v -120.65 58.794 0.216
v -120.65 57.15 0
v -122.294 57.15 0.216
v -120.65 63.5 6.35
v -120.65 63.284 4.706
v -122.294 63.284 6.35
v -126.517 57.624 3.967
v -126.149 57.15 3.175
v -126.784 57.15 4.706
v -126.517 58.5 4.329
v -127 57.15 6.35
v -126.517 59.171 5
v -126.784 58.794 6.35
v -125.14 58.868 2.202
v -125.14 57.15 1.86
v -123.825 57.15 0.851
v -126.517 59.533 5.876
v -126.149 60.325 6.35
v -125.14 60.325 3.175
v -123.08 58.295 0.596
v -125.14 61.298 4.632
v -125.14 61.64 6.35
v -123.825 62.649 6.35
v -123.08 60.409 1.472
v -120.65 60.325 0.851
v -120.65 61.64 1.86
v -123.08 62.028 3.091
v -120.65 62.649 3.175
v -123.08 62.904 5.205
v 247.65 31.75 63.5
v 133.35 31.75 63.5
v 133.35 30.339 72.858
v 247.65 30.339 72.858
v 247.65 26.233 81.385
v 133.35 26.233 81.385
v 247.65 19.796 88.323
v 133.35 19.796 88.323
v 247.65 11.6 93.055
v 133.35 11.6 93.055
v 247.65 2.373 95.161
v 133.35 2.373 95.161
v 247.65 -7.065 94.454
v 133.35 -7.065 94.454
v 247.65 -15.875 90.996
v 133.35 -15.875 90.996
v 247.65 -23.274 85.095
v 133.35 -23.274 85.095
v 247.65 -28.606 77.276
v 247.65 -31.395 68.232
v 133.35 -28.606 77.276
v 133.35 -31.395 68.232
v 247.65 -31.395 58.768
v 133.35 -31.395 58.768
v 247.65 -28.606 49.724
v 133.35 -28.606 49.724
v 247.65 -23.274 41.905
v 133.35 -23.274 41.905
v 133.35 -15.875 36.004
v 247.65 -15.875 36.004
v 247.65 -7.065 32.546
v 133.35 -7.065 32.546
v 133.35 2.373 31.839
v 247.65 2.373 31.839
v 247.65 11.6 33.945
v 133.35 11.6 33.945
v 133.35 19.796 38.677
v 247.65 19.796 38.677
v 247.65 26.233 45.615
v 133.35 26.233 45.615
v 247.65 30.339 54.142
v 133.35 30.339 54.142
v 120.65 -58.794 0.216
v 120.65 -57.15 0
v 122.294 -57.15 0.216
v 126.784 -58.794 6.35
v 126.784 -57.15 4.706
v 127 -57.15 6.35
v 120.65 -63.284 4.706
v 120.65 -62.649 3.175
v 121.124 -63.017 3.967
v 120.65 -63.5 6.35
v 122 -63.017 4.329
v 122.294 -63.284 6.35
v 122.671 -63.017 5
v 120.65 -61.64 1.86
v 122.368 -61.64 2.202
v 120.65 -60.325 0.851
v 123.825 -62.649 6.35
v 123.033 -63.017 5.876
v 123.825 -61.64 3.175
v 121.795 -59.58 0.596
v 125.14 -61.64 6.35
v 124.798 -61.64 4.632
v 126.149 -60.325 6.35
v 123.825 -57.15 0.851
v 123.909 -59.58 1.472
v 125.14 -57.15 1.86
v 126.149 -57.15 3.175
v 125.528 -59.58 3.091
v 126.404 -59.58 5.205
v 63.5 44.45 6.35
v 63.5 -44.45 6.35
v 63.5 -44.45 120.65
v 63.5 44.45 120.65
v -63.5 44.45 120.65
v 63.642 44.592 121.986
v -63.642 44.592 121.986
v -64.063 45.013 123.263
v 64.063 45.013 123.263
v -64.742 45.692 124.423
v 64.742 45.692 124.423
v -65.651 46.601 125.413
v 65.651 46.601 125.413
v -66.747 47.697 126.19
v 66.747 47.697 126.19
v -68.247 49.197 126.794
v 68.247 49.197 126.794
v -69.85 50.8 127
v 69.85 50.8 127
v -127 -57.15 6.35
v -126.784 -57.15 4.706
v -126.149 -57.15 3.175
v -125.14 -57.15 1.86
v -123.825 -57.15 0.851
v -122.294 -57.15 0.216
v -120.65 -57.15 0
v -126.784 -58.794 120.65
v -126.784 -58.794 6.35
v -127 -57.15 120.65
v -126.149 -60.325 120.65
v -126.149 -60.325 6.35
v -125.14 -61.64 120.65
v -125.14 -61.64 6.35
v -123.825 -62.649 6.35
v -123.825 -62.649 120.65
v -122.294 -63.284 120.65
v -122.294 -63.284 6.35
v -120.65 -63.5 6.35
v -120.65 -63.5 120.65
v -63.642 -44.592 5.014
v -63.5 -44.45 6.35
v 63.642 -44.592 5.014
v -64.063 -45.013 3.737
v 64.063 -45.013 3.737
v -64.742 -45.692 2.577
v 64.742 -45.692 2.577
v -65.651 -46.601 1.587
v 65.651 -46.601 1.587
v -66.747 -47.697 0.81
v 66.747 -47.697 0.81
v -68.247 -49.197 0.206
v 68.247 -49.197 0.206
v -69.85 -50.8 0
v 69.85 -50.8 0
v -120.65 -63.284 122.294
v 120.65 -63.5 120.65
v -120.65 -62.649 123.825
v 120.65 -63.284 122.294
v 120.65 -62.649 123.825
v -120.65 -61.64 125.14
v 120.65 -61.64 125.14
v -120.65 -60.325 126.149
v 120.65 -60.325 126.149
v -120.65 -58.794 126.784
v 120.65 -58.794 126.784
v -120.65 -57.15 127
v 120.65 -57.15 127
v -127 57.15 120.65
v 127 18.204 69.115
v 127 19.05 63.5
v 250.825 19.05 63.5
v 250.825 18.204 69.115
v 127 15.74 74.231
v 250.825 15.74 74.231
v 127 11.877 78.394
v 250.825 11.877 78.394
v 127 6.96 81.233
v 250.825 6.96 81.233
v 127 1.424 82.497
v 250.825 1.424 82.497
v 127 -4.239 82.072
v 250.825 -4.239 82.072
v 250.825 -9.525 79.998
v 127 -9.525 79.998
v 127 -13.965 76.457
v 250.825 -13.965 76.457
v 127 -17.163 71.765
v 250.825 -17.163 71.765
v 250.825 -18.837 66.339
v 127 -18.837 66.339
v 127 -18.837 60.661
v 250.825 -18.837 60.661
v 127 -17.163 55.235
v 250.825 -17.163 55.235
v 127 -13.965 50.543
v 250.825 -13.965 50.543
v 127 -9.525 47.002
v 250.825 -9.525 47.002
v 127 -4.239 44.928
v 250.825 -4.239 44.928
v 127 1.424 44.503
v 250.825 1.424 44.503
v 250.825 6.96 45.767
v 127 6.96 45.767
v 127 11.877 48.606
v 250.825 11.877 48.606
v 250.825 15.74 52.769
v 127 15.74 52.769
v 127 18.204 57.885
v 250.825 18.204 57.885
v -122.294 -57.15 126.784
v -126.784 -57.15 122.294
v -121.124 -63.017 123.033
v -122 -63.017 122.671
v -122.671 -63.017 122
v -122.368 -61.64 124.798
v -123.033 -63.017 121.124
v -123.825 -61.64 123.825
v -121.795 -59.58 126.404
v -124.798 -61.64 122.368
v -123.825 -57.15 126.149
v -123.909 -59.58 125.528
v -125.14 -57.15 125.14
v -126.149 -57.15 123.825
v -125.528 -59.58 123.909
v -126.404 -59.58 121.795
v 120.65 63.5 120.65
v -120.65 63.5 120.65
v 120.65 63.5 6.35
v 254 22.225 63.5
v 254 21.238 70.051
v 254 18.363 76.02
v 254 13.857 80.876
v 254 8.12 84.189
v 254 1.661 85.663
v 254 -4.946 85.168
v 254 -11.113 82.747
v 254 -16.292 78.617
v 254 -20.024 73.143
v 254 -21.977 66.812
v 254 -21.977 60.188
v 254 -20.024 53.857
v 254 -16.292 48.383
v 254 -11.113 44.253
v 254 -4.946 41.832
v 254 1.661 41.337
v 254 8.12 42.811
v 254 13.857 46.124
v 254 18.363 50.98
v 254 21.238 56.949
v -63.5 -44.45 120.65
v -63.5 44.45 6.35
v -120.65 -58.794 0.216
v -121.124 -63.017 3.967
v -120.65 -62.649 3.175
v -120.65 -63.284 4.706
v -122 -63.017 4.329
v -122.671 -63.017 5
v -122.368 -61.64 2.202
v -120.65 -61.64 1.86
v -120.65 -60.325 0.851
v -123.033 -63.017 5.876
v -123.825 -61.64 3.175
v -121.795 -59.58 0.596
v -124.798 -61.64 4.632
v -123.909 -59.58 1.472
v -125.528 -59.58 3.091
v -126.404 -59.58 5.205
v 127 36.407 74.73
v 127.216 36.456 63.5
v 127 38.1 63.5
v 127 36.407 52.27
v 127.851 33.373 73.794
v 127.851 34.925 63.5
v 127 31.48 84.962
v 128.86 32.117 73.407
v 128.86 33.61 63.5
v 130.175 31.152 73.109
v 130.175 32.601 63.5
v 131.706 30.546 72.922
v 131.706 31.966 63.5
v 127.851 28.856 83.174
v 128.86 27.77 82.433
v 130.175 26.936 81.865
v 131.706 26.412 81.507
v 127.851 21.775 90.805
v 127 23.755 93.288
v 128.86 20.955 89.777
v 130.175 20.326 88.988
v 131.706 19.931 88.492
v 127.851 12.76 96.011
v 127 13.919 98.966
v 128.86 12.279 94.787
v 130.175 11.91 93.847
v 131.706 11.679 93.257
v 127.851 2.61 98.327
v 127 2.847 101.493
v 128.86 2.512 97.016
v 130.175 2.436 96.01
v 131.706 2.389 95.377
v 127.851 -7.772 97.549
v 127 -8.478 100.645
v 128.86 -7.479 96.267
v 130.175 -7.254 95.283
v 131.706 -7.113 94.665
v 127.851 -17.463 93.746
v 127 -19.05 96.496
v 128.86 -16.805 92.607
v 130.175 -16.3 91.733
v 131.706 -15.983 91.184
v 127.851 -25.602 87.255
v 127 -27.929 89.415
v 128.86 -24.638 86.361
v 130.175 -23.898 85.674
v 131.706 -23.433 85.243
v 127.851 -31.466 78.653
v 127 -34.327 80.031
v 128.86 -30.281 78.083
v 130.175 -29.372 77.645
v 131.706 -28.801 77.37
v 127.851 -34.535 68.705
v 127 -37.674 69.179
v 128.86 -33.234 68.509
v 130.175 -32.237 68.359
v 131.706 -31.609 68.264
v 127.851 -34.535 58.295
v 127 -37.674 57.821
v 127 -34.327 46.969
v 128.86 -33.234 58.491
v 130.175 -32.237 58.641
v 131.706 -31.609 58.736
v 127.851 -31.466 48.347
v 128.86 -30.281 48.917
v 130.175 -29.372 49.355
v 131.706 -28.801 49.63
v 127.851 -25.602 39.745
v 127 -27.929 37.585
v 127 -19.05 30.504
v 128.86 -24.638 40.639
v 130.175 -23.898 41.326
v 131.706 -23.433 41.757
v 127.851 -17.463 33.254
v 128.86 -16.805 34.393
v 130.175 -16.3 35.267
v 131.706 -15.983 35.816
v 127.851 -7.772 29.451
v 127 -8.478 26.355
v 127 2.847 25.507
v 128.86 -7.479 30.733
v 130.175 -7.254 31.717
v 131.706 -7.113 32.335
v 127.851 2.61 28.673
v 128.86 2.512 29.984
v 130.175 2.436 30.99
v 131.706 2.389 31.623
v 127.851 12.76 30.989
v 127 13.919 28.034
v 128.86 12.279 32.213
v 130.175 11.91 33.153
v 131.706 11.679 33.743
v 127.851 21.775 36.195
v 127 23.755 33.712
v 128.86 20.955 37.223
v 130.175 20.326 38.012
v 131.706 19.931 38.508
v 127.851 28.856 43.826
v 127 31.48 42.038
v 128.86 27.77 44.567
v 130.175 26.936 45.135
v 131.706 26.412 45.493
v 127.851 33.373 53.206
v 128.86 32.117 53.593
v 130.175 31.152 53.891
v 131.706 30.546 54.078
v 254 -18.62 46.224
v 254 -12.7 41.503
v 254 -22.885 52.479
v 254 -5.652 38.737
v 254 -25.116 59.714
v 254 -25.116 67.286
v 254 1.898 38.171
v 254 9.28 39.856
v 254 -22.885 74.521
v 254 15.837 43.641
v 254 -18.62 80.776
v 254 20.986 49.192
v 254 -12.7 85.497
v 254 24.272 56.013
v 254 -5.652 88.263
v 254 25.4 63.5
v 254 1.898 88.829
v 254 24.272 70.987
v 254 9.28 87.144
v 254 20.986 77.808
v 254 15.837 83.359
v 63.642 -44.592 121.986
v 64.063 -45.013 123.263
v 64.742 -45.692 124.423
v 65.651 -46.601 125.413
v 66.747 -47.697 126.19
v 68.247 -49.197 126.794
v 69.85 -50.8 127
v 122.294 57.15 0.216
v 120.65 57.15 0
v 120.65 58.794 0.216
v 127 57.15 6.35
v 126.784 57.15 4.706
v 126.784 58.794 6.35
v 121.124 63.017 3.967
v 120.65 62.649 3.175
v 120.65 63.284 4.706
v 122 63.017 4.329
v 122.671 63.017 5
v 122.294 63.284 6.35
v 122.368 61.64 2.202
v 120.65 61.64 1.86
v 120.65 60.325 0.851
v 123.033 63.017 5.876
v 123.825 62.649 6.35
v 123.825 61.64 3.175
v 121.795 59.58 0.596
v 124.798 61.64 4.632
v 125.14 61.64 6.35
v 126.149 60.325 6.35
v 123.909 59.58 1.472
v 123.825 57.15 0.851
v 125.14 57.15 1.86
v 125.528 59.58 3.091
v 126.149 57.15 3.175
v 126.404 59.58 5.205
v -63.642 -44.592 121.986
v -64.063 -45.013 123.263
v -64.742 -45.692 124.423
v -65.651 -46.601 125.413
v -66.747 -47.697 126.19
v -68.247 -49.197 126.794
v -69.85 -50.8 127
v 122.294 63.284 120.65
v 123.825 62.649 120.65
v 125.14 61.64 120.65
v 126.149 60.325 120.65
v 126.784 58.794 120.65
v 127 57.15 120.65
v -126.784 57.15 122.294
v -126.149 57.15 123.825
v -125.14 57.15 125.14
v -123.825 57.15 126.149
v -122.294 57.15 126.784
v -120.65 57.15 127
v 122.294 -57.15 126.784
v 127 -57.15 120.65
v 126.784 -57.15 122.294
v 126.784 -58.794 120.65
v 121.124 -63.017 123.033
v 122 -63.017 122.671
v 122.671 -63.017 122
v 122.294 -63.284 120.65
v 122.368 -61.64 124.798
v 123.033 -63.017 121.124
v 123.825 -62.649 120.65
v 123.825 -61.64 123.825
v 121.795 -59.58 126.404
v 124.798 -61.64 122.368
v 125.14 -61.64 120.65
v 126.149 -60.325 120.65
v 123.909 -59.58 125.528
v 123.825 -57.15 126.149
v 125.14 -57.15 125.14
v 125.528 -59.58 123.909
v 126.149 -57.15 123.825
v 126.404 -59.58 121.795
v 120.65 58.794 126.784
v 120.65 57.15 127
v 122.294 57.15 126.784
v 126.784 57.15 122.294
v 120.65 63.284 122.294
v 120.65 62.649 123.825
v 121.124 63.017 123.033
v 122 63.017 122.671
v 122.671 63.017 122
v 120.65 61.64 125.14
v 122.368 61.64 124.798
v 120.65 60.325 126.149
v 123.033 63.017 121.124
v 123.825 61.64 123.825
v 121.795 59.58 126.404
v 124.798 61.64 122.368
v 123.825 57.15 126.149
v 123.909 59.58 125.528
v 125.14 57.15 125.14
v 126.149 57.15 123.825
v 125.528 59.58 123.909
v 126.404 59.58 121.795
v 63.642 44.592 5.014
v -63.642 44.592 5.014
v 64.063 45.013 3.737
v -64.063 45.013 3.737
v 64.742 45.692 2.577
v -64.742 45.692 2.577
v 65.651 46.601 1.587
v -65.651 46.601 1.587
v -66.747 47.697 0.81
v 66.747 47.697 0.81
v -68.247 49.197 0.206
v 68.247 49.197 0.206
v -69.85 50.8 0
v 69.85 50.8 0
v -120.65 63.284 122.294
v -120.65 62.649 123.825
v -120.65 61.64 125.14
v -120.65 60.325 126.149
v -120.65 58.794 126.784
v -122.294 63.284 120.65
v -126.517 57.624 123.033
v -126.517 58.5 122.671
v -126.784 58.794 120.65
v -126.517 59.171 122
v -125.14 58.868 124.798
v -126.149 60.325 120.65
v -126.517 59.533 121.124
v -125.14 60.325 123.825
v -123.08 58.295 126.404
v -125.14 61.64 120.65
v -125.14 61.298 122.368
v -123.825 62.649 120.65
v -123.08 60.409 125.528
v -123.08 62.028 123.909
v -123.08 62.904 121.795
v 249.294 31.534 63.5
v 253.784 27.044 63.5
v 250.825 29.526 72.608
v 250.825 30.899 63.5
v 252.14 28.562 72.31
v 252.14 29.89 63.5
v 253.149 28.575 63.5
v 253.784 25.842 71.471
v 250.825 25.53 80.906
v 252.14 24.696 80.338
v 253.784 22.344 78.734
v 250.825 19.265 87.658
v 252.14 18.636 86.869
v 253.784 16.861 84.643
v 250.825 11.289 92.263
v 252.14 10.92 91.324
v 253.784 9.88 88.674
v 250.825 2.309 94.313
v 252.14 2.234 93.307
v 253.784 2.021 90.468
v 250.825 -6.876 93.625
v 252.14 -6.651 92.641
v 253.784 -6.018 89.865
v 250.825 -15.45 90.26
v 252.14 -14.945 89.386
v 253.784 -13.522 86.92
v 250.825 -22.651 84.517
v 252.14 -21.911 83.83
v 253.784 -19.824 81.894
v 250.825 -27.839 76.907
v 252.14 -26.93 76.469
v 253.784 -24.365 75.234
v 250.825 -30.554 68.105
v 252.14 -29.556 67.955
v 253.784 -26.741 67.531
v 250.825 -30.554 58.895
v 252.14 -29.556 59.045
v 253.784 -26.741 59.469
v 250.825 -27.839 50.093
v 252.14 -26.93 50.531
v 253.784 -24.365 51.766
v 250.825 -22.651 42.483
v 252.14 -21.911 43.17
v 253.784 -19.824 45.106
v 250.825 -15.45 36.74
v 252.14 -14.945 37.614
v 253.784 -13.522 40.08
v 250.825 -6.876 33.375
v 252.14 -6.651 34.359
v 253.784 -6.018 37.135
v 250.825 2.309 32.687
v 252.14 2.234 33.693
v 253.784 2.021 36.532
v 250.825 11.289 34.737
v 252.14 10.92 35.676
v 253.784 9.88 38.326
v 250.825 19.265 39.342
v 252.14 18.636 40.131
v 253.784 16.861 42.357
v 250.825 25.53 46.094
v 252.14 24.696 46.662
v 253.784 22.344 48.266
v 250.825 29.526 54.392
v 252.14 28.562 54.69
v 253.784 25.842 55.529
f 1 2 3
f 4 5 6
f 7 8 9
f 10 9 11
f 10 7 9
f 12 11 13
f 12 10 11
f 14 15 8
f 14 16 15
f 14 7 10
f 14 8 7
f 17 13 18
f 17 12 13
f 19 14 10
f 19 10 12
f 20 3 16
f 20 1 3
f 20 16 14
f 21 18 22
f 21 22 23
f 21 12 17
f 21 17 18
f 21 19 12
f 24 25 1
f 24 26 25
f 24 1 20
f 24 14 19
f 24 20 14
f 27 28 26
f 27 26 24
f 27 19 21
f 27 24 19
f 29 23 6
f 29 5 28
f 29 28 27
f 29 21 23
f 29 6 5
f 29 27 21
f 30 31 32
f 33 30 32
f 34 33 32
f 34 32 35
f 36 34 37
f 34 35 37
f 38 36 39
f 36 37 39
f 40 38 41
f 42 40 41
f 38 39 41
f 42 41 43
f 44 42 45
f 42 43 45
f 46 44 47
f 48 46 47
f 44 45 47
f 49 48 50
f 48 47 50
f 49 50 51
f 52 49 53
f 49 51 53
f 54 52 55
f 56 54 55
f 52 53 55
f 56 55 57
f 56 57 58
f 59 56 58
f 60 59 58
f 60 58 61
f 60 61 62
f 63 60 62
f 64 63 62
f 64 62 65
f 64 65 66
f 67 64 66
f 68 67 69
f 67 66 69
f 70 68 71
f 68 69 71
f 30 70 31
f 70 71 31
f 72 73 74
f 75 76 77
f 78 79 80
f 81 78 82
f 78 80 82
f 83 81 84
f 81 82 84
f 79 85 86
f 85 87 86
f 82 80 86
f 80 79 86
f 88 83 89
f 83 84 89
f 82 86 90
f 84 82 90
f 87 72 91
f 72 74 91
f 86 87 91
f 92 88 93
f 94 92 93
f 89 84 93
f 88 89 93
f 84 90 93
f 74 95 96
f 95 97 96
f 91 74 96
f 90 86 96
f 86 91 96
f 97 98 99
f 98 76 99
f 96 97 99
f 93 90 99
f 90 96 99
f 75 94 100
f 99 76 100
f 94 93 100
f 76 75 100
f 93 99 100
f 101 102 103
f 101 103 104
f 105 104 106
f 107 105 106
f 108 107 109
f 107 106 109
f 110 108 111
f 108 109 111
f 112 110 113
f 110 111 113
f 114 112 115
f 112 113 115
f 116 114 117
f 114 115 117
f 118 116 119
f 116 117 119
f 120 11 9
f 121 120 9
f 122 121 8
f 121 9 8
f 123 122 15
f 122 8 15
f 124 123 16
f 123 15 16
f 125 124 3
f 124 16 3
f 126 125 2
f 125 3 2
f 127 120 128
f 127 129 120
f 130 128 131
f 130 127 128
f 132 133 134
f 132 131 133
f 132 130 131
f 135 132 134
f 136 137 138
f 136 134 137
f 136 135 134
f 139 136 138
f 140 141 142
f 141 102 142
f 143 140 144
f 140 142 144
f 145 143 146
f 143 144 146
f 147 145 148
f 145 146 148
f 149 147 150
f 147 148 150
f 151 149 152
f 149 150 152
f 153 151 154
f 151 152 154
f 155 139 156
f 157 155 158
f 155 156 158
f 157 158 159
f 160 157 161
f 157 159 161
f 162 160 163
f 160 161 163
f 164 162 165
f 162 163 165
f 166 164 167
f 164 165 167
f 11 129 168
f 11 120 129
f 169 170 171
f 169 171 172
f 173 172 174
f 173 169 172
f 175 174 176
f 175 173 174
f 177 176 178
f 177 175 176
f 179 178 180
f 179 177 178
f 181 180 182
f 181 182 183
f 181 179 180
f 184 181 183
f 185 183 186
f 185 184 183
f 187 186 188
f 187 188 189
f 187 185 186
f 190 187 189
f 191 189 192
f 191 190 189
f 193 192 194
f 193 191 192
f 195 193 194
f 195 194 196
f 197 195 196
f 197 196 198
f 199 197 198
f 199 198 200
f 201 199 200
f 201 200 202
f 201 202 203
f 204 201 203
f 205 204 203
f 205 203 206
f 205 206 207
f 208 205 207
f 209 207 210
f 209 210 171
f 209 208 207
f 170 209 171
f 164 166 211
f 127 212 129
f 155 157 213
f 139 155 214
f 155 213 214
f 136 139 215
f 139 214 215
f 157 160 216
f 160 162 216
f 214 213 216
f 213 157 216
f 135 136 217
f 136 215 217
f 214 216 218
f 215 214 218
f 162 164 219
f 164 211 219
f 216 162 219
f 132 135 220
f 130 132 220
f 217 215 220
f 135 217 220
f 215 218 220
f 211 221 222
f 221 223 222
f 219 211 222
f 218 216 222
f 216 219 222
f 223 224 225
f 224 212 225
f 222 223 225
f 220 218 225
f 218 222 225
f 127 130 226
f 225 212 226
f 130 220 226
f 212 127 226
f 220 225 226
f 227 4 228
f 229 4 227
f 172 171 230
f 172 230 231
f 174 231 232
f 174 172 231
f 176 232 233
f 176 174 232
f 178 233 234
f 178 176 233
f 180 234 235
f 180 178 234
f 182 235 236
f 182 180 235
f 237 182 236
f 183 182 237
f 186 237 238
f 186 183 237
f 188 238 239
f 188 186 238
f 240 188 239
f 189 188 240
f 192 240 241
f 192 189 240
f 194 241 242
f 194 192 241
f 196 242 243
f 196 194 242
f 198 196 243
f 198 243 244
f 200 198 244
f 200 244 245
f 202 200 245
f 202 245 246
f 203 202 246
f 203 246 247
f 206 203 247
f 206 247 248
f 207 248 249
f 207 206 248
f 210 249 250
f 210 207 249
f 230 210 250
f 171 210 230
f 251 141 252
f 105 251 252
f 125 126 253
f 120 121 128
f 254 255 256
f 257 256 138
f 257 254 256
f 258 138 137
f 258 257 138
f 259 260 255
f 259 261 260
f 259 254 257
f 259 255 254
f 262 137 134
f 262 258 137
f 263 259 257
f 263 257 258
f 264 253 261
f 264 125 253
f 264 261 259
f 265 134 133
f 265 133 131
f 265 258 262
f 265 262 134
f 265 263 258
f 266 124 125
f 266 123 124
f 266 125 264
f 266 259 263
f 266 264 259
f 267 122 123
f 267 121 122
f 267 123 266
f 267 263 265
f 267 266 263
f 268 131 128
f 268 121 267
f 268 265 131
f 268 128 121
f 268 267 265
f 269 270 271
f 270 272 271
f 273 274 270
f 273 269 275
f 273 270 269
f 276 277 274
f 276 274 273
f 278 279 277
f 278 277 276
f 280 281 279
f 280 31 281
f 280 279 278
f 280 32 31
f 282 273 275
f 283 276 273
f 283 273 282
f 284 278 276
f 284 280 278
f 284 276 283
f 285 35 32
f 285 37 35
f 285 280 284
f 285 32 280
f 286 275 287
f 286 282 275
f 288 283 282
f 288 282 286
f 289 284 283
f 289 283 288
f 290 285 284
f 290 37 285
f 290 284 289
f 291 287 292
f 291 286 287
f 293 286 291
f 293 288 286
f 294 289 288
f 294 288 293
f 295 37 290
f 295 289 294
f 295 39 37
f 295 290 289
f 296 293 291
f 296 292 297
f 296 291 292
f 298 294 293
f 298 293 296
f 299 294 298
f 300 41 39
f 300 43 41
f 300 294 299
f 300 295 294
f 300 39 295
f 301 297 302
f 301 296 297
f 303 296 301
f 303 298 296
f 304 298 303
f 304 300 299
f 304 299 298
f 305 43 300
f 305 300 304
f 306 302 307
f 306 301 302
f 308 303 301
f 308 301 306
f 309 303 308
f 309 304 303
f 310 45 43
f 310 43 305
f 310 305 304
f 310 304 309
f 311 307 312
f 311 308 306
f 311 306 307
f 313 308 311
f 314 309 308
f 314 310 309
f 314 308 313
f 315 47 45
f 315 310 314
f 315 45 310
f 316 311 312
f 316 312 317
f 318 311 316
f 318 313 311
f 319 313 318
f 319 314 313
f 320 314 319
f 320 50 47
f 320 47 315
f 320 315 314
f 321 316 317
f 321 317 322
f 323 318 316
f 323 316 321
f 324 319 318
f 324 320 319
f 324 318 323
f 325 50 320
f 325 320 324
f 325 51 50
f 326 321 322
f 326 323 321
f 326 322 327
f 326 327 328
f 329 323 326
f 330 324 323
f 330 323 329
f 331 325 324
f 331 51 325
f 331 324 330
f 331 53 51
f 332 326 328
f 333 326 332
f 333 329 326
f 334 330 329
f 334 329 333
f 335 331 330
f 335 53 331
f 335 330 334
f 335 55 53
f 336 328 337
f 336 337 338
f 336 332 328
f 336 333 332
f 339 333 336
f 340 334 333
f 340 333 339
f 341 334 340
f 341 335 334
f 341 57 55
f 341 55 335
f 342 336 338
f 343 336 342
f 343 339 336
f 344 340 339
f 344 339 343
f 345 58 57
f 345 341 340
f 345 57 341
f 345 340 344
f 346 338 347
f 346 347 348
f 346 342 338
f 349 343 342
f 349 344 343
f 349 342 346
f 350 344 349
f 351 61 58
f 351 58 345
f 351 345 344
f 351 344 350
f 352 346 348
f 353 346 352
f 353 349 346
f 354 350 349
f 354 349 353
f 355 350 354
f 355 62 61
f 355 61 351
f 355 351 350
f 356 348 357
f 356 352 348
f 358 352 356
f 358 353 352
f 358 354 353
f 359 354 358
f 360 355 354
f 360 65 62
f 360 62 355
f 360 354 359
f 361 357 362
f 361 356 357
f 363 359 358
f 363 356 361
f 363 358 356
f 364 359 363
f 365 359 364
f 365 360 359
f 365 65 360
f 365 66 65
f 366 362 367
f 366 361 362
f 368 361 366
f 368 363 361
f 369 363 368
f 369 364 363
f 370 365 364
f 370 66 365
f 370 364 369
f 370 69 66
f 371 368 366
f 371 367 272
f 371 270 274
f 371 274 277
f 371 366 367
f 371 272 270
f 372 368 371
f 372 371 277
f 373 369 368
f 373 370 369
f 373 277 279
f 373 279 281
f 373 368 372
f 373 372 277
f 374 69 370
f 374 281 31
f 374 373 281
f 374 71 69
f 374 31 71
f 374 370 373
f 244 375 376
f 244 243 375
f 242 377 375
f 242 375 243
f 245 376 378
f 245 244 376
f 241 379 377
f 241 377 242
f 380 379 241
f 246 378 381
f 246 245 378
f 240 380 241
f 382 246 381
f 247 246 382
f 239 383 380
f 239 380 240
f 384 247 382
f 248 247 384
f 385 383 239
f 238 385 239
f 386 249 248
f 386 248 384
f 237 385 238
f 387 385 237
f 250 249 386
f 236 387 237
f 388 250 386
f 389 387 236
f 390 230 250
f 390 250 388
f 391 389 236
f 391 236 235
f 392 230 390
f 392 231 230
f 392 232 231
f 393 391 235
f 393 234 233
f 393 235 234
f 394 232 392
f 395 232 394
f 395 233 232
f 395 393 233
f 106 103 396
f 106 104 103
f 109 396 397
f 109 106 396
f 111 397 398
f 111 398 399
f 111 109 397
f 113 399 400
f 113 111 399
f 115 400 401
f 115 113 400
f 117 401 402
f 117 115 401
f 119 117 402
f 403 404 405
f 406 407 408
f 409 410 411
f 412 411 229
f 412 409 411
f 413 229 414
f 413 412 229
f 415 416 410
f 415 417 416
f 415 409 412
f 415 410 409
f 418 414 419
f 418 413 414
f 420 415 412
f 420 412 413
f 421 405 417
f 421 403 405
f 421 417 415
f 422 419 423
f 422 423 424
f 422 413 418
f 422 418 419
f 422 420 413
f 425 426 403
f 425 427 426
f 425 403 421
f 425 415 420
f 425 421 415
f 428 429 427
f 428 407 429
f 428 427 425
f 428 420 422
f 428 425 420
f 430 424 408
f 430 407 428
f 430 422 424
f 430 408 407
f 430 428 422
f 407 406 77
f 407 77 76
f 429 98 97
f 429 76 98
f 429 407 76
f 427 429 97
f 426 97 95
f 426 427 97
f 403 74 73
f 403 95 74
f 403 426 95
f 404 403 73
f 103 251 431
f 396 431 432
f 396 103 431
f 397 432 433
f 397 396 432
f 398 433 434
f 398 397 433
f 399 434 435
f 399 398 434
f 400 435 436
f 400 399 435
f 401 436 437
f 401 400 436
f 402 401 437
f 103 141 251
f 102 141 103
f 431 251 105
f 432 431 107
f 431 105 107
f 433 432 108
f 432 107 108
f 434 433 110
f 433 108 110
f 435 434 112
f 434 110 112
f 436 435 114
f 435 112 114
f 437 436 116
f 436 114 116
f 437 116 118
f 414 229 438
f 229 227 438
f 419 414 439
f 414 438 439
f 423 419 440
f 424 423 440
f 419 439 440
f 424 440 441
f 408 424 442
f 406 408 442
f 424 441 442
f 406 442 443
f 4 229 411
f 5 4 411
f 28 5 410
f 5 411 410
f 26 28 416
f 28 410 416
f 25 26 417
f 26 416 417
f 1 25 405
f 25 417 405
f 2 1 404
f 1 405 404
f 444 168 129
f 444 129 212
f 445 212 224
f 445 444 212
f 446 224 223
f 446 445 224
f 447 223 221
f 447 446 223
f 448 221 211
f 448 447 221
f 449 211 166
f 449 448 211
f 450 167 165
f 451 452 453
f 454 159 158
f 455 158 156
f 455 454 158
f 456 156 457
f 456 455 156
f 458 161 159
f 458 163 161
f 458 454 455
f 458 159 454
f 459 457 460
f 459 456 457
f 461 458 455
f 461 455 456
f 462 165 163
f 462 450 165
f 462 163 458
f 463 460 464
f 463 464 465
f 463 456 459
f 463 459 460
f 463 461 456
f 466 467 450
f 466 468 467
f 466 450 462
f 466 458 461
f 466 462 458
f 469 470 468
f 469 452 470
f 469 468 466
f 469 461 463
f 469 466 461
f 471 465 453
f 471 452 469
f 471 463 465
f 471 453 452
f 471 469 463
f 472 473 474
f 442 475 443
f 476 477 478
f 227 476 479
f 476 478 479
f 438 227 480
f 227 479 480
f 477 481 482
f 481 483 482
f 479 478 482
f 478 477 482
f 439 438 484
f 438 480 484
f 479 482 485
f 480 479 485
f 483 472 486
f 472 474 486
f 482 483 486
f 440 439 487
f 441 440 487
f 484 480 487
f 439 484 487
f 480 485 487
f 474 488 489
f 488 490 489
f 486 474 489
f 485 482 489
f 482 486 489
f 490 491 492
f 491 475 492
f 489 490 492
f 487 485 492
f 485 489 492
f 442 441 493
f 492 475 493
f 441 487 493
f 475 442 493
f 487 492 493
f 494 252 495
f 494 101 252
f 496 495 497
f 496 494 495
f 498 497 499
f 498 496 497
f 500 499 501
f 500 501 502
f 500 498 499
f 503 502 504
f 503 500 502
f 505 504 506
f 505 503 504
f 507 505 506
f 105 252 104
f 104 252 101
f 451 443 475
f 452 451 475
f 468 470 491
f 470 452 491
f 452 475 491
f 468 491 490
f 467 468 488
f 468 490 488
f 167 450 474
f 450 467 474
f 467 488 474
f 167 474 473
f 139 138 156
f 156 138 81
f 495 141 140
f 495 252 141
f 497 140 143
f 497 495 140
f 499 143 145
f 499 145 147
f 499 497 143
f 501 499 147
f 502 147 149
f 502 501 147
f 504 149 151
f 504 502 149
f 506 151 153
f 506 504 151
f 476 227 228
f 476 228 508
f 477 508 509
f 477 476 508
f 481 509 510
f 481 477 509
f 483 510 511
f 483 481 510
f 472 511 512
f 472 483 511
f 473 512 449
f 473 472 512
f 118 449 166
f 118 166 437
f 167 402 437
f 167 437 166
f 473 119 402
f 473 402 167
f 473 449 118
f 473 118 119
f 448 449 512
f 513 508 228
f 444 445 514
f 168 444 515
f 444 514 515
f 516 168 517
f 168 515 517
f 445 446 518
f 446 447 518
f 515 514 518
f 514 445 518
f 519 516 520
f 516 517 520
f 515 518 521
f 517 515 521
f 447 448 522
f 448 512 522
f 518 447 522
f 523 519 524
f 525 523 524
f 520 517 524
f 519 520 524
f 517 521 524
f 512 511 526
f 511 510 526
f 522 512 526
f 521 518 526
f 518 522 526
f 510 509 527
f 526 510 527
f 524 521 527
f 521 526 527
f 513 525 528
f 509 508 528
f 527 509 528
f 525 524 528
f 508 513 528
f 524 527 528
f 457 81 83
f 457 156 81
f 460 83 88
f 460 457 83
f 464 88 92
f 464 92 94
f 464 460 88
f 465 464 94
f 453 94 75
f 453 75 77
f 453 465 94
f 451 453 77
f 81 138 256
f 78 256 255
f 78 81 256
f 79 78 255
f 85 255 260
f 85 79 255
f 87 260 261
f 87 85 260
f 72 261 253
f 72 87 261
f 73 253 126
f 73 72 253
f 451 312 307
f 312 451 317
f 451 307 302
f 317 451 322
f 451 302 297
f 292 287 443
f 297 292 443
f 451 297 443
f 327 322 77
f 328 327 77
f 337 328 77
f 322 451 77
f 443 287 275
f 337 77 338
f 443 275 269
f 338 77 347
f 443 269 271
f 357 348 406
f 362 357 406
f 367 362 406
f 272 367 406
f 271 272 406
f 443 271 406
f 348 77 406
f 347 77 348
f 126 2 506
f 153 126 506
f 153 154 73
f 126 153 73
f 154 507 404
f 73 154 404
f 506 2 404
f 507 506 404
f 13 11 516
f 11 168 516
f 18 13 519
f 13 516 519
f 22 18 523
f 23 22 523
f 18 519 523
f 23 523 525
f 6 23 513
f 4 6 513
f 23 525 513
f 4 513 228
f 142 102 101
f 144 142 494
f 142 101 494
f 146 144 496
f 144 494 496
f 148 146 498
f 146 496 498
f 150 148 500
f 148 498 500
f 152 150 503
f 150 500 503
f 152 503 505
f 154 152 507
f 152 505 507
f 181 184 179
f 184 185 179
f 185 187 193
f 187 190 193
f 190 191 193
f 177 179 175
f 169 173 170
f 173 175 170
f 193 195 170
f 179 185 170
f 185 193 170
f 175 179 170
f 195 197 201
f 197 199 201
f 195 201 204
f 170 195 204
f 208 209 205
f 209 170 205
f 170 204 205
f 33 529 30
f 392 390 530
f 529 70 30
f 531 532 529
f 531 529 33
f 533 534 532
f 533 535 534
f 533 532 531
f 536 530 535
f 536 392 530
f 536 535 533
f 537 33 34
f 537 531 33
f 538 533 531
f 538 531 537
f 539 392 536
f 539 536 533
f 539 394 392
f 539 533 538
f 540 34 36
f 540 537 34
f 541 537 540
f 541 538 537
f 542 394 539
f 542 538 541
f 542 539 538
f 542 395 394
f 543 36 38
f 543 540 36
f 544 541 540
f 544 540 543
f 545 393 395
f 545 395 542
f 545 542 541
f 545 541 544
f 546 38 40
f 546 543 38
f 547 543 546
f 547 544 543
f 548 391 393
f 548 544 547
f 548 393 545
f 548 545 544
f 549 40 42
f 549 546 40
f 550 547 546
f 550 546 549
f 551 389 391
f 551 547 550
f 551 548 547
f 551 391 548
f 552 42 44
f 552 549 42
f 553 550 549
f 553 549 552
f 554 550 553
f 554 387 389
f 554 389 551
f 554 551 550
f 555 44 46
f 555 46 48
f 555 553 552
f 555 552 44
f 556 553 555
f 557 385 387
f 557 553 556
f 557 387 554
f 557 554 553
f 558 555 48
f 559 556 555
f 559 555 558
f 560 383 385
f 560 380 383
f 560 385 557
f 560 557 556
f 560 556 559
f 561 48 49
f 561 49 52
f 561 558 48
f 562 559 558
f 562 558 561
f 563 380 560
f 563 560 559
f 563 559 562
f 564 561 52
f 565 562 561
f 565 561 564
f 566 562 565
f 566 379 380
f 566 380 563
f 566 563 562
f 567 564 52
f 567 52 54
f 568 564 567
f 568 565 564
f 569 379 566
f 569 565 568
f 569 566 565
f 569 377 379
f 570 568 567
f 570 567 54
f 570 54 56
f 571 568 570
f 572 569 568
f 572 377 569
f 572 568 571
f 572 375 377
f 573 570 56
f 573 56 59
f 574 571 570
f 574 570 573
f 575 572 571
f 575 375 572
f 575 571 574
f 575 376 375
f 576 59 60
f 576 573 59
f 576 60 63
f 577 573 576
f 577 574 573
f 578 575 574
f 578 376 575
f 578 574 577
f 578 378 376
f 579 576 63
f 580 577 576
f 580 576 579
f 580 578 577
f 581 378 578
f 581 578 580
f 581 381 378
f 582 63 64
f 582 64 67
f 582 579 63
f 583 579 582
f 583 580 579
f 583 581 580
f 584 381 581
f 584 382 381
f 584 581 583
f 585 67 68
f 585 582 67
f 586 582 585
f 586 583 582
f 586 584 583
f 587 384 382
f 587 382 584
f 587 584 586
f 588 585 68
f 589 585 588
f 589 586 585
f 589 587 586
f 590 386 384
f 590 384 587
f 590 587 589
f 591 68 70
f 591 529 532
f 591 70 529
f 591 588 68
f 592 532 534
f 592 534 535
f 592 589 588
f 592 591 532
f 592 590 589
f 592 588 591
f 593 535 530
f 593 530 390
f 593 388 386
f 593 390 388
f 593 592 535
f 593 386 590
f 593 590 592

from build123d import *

# Parameters (mm, degrees)
F0_W     = 254
F0_H     = 127
F0_W_2   = 127
F0_H_2   = 88.9
F1_DEPTH = 127
F2_R     = 6.35
F3_R     = 31.75
F3_R_2   = 19.05
F4_DEPTH = 127
F5_R     = 6.35
F6_SIZE  = 3.175


with BuildPart() as f1:
    # F0 (on Top) → F1 (new body)
    with BuildSketch(Plane.XY):
        Rectangle(F0_W, F0_H)
        Rectangle(F0_W_2, F0_H_2, mode=Mode.SUBTRACT)
    extrude(amount=F1_DEPTH)

    # F2
    f2_edges = [f1.edges().sort_by_distance(p)[0] for p in [
        (127, 0, 127),
        (0, 63.5, 127),
        (-127, 0, 127),
        (0, -63.5, 127),
        (0, -44.45, 127),
        (-63.5, 0, 127),
        (0, 44.45, 127),
        (63.5, 0, 127),
        (127, 0, 0),
        (0, 63.5, 0),
        (-127, 0, 0),
        (0, -63.5, 0),
        (0, -44.45, 0),
        (-63.5, 0, 0),
        (0, 44.45, 0),
        (63.5, 0, 0),
        (-127, -63.5, 63.5),
        (127, -63.5, 63.5),
        (127, 63.5, 63.5),
        (-127, 63.5, 63.5),
    ]]
    fillet(f2_edges, radius=F2_R)

    # F3 (on face) → F4 (join)
    with BuildSketch(Plane.YZ.offset(127)):
        with Locations((0, 63.5)):
            Circle(F3_R)
        with Locations((0, 63.5)):
            Circle(F3_R_2, mode=Mode.SUBTRACT)
    extrude(amount=F4_DEPTH)

    # F5
    f5_edges = [f1.edges().sort_by_distance(p)[0] for p in [
        (127, -31.75, 63.5),
        (254, -31.75, 63.5),
    ]]
    fillet(f5_edges, radius=F5_R)

    # F6
    f6_edges = [f1.edges().sort_by_distance(p)[0] for p in [
        (254, -19.05, 63.5),
    ]]
    chamfer(f6_edges, length=F6_SIZE)


solid = f1.part
